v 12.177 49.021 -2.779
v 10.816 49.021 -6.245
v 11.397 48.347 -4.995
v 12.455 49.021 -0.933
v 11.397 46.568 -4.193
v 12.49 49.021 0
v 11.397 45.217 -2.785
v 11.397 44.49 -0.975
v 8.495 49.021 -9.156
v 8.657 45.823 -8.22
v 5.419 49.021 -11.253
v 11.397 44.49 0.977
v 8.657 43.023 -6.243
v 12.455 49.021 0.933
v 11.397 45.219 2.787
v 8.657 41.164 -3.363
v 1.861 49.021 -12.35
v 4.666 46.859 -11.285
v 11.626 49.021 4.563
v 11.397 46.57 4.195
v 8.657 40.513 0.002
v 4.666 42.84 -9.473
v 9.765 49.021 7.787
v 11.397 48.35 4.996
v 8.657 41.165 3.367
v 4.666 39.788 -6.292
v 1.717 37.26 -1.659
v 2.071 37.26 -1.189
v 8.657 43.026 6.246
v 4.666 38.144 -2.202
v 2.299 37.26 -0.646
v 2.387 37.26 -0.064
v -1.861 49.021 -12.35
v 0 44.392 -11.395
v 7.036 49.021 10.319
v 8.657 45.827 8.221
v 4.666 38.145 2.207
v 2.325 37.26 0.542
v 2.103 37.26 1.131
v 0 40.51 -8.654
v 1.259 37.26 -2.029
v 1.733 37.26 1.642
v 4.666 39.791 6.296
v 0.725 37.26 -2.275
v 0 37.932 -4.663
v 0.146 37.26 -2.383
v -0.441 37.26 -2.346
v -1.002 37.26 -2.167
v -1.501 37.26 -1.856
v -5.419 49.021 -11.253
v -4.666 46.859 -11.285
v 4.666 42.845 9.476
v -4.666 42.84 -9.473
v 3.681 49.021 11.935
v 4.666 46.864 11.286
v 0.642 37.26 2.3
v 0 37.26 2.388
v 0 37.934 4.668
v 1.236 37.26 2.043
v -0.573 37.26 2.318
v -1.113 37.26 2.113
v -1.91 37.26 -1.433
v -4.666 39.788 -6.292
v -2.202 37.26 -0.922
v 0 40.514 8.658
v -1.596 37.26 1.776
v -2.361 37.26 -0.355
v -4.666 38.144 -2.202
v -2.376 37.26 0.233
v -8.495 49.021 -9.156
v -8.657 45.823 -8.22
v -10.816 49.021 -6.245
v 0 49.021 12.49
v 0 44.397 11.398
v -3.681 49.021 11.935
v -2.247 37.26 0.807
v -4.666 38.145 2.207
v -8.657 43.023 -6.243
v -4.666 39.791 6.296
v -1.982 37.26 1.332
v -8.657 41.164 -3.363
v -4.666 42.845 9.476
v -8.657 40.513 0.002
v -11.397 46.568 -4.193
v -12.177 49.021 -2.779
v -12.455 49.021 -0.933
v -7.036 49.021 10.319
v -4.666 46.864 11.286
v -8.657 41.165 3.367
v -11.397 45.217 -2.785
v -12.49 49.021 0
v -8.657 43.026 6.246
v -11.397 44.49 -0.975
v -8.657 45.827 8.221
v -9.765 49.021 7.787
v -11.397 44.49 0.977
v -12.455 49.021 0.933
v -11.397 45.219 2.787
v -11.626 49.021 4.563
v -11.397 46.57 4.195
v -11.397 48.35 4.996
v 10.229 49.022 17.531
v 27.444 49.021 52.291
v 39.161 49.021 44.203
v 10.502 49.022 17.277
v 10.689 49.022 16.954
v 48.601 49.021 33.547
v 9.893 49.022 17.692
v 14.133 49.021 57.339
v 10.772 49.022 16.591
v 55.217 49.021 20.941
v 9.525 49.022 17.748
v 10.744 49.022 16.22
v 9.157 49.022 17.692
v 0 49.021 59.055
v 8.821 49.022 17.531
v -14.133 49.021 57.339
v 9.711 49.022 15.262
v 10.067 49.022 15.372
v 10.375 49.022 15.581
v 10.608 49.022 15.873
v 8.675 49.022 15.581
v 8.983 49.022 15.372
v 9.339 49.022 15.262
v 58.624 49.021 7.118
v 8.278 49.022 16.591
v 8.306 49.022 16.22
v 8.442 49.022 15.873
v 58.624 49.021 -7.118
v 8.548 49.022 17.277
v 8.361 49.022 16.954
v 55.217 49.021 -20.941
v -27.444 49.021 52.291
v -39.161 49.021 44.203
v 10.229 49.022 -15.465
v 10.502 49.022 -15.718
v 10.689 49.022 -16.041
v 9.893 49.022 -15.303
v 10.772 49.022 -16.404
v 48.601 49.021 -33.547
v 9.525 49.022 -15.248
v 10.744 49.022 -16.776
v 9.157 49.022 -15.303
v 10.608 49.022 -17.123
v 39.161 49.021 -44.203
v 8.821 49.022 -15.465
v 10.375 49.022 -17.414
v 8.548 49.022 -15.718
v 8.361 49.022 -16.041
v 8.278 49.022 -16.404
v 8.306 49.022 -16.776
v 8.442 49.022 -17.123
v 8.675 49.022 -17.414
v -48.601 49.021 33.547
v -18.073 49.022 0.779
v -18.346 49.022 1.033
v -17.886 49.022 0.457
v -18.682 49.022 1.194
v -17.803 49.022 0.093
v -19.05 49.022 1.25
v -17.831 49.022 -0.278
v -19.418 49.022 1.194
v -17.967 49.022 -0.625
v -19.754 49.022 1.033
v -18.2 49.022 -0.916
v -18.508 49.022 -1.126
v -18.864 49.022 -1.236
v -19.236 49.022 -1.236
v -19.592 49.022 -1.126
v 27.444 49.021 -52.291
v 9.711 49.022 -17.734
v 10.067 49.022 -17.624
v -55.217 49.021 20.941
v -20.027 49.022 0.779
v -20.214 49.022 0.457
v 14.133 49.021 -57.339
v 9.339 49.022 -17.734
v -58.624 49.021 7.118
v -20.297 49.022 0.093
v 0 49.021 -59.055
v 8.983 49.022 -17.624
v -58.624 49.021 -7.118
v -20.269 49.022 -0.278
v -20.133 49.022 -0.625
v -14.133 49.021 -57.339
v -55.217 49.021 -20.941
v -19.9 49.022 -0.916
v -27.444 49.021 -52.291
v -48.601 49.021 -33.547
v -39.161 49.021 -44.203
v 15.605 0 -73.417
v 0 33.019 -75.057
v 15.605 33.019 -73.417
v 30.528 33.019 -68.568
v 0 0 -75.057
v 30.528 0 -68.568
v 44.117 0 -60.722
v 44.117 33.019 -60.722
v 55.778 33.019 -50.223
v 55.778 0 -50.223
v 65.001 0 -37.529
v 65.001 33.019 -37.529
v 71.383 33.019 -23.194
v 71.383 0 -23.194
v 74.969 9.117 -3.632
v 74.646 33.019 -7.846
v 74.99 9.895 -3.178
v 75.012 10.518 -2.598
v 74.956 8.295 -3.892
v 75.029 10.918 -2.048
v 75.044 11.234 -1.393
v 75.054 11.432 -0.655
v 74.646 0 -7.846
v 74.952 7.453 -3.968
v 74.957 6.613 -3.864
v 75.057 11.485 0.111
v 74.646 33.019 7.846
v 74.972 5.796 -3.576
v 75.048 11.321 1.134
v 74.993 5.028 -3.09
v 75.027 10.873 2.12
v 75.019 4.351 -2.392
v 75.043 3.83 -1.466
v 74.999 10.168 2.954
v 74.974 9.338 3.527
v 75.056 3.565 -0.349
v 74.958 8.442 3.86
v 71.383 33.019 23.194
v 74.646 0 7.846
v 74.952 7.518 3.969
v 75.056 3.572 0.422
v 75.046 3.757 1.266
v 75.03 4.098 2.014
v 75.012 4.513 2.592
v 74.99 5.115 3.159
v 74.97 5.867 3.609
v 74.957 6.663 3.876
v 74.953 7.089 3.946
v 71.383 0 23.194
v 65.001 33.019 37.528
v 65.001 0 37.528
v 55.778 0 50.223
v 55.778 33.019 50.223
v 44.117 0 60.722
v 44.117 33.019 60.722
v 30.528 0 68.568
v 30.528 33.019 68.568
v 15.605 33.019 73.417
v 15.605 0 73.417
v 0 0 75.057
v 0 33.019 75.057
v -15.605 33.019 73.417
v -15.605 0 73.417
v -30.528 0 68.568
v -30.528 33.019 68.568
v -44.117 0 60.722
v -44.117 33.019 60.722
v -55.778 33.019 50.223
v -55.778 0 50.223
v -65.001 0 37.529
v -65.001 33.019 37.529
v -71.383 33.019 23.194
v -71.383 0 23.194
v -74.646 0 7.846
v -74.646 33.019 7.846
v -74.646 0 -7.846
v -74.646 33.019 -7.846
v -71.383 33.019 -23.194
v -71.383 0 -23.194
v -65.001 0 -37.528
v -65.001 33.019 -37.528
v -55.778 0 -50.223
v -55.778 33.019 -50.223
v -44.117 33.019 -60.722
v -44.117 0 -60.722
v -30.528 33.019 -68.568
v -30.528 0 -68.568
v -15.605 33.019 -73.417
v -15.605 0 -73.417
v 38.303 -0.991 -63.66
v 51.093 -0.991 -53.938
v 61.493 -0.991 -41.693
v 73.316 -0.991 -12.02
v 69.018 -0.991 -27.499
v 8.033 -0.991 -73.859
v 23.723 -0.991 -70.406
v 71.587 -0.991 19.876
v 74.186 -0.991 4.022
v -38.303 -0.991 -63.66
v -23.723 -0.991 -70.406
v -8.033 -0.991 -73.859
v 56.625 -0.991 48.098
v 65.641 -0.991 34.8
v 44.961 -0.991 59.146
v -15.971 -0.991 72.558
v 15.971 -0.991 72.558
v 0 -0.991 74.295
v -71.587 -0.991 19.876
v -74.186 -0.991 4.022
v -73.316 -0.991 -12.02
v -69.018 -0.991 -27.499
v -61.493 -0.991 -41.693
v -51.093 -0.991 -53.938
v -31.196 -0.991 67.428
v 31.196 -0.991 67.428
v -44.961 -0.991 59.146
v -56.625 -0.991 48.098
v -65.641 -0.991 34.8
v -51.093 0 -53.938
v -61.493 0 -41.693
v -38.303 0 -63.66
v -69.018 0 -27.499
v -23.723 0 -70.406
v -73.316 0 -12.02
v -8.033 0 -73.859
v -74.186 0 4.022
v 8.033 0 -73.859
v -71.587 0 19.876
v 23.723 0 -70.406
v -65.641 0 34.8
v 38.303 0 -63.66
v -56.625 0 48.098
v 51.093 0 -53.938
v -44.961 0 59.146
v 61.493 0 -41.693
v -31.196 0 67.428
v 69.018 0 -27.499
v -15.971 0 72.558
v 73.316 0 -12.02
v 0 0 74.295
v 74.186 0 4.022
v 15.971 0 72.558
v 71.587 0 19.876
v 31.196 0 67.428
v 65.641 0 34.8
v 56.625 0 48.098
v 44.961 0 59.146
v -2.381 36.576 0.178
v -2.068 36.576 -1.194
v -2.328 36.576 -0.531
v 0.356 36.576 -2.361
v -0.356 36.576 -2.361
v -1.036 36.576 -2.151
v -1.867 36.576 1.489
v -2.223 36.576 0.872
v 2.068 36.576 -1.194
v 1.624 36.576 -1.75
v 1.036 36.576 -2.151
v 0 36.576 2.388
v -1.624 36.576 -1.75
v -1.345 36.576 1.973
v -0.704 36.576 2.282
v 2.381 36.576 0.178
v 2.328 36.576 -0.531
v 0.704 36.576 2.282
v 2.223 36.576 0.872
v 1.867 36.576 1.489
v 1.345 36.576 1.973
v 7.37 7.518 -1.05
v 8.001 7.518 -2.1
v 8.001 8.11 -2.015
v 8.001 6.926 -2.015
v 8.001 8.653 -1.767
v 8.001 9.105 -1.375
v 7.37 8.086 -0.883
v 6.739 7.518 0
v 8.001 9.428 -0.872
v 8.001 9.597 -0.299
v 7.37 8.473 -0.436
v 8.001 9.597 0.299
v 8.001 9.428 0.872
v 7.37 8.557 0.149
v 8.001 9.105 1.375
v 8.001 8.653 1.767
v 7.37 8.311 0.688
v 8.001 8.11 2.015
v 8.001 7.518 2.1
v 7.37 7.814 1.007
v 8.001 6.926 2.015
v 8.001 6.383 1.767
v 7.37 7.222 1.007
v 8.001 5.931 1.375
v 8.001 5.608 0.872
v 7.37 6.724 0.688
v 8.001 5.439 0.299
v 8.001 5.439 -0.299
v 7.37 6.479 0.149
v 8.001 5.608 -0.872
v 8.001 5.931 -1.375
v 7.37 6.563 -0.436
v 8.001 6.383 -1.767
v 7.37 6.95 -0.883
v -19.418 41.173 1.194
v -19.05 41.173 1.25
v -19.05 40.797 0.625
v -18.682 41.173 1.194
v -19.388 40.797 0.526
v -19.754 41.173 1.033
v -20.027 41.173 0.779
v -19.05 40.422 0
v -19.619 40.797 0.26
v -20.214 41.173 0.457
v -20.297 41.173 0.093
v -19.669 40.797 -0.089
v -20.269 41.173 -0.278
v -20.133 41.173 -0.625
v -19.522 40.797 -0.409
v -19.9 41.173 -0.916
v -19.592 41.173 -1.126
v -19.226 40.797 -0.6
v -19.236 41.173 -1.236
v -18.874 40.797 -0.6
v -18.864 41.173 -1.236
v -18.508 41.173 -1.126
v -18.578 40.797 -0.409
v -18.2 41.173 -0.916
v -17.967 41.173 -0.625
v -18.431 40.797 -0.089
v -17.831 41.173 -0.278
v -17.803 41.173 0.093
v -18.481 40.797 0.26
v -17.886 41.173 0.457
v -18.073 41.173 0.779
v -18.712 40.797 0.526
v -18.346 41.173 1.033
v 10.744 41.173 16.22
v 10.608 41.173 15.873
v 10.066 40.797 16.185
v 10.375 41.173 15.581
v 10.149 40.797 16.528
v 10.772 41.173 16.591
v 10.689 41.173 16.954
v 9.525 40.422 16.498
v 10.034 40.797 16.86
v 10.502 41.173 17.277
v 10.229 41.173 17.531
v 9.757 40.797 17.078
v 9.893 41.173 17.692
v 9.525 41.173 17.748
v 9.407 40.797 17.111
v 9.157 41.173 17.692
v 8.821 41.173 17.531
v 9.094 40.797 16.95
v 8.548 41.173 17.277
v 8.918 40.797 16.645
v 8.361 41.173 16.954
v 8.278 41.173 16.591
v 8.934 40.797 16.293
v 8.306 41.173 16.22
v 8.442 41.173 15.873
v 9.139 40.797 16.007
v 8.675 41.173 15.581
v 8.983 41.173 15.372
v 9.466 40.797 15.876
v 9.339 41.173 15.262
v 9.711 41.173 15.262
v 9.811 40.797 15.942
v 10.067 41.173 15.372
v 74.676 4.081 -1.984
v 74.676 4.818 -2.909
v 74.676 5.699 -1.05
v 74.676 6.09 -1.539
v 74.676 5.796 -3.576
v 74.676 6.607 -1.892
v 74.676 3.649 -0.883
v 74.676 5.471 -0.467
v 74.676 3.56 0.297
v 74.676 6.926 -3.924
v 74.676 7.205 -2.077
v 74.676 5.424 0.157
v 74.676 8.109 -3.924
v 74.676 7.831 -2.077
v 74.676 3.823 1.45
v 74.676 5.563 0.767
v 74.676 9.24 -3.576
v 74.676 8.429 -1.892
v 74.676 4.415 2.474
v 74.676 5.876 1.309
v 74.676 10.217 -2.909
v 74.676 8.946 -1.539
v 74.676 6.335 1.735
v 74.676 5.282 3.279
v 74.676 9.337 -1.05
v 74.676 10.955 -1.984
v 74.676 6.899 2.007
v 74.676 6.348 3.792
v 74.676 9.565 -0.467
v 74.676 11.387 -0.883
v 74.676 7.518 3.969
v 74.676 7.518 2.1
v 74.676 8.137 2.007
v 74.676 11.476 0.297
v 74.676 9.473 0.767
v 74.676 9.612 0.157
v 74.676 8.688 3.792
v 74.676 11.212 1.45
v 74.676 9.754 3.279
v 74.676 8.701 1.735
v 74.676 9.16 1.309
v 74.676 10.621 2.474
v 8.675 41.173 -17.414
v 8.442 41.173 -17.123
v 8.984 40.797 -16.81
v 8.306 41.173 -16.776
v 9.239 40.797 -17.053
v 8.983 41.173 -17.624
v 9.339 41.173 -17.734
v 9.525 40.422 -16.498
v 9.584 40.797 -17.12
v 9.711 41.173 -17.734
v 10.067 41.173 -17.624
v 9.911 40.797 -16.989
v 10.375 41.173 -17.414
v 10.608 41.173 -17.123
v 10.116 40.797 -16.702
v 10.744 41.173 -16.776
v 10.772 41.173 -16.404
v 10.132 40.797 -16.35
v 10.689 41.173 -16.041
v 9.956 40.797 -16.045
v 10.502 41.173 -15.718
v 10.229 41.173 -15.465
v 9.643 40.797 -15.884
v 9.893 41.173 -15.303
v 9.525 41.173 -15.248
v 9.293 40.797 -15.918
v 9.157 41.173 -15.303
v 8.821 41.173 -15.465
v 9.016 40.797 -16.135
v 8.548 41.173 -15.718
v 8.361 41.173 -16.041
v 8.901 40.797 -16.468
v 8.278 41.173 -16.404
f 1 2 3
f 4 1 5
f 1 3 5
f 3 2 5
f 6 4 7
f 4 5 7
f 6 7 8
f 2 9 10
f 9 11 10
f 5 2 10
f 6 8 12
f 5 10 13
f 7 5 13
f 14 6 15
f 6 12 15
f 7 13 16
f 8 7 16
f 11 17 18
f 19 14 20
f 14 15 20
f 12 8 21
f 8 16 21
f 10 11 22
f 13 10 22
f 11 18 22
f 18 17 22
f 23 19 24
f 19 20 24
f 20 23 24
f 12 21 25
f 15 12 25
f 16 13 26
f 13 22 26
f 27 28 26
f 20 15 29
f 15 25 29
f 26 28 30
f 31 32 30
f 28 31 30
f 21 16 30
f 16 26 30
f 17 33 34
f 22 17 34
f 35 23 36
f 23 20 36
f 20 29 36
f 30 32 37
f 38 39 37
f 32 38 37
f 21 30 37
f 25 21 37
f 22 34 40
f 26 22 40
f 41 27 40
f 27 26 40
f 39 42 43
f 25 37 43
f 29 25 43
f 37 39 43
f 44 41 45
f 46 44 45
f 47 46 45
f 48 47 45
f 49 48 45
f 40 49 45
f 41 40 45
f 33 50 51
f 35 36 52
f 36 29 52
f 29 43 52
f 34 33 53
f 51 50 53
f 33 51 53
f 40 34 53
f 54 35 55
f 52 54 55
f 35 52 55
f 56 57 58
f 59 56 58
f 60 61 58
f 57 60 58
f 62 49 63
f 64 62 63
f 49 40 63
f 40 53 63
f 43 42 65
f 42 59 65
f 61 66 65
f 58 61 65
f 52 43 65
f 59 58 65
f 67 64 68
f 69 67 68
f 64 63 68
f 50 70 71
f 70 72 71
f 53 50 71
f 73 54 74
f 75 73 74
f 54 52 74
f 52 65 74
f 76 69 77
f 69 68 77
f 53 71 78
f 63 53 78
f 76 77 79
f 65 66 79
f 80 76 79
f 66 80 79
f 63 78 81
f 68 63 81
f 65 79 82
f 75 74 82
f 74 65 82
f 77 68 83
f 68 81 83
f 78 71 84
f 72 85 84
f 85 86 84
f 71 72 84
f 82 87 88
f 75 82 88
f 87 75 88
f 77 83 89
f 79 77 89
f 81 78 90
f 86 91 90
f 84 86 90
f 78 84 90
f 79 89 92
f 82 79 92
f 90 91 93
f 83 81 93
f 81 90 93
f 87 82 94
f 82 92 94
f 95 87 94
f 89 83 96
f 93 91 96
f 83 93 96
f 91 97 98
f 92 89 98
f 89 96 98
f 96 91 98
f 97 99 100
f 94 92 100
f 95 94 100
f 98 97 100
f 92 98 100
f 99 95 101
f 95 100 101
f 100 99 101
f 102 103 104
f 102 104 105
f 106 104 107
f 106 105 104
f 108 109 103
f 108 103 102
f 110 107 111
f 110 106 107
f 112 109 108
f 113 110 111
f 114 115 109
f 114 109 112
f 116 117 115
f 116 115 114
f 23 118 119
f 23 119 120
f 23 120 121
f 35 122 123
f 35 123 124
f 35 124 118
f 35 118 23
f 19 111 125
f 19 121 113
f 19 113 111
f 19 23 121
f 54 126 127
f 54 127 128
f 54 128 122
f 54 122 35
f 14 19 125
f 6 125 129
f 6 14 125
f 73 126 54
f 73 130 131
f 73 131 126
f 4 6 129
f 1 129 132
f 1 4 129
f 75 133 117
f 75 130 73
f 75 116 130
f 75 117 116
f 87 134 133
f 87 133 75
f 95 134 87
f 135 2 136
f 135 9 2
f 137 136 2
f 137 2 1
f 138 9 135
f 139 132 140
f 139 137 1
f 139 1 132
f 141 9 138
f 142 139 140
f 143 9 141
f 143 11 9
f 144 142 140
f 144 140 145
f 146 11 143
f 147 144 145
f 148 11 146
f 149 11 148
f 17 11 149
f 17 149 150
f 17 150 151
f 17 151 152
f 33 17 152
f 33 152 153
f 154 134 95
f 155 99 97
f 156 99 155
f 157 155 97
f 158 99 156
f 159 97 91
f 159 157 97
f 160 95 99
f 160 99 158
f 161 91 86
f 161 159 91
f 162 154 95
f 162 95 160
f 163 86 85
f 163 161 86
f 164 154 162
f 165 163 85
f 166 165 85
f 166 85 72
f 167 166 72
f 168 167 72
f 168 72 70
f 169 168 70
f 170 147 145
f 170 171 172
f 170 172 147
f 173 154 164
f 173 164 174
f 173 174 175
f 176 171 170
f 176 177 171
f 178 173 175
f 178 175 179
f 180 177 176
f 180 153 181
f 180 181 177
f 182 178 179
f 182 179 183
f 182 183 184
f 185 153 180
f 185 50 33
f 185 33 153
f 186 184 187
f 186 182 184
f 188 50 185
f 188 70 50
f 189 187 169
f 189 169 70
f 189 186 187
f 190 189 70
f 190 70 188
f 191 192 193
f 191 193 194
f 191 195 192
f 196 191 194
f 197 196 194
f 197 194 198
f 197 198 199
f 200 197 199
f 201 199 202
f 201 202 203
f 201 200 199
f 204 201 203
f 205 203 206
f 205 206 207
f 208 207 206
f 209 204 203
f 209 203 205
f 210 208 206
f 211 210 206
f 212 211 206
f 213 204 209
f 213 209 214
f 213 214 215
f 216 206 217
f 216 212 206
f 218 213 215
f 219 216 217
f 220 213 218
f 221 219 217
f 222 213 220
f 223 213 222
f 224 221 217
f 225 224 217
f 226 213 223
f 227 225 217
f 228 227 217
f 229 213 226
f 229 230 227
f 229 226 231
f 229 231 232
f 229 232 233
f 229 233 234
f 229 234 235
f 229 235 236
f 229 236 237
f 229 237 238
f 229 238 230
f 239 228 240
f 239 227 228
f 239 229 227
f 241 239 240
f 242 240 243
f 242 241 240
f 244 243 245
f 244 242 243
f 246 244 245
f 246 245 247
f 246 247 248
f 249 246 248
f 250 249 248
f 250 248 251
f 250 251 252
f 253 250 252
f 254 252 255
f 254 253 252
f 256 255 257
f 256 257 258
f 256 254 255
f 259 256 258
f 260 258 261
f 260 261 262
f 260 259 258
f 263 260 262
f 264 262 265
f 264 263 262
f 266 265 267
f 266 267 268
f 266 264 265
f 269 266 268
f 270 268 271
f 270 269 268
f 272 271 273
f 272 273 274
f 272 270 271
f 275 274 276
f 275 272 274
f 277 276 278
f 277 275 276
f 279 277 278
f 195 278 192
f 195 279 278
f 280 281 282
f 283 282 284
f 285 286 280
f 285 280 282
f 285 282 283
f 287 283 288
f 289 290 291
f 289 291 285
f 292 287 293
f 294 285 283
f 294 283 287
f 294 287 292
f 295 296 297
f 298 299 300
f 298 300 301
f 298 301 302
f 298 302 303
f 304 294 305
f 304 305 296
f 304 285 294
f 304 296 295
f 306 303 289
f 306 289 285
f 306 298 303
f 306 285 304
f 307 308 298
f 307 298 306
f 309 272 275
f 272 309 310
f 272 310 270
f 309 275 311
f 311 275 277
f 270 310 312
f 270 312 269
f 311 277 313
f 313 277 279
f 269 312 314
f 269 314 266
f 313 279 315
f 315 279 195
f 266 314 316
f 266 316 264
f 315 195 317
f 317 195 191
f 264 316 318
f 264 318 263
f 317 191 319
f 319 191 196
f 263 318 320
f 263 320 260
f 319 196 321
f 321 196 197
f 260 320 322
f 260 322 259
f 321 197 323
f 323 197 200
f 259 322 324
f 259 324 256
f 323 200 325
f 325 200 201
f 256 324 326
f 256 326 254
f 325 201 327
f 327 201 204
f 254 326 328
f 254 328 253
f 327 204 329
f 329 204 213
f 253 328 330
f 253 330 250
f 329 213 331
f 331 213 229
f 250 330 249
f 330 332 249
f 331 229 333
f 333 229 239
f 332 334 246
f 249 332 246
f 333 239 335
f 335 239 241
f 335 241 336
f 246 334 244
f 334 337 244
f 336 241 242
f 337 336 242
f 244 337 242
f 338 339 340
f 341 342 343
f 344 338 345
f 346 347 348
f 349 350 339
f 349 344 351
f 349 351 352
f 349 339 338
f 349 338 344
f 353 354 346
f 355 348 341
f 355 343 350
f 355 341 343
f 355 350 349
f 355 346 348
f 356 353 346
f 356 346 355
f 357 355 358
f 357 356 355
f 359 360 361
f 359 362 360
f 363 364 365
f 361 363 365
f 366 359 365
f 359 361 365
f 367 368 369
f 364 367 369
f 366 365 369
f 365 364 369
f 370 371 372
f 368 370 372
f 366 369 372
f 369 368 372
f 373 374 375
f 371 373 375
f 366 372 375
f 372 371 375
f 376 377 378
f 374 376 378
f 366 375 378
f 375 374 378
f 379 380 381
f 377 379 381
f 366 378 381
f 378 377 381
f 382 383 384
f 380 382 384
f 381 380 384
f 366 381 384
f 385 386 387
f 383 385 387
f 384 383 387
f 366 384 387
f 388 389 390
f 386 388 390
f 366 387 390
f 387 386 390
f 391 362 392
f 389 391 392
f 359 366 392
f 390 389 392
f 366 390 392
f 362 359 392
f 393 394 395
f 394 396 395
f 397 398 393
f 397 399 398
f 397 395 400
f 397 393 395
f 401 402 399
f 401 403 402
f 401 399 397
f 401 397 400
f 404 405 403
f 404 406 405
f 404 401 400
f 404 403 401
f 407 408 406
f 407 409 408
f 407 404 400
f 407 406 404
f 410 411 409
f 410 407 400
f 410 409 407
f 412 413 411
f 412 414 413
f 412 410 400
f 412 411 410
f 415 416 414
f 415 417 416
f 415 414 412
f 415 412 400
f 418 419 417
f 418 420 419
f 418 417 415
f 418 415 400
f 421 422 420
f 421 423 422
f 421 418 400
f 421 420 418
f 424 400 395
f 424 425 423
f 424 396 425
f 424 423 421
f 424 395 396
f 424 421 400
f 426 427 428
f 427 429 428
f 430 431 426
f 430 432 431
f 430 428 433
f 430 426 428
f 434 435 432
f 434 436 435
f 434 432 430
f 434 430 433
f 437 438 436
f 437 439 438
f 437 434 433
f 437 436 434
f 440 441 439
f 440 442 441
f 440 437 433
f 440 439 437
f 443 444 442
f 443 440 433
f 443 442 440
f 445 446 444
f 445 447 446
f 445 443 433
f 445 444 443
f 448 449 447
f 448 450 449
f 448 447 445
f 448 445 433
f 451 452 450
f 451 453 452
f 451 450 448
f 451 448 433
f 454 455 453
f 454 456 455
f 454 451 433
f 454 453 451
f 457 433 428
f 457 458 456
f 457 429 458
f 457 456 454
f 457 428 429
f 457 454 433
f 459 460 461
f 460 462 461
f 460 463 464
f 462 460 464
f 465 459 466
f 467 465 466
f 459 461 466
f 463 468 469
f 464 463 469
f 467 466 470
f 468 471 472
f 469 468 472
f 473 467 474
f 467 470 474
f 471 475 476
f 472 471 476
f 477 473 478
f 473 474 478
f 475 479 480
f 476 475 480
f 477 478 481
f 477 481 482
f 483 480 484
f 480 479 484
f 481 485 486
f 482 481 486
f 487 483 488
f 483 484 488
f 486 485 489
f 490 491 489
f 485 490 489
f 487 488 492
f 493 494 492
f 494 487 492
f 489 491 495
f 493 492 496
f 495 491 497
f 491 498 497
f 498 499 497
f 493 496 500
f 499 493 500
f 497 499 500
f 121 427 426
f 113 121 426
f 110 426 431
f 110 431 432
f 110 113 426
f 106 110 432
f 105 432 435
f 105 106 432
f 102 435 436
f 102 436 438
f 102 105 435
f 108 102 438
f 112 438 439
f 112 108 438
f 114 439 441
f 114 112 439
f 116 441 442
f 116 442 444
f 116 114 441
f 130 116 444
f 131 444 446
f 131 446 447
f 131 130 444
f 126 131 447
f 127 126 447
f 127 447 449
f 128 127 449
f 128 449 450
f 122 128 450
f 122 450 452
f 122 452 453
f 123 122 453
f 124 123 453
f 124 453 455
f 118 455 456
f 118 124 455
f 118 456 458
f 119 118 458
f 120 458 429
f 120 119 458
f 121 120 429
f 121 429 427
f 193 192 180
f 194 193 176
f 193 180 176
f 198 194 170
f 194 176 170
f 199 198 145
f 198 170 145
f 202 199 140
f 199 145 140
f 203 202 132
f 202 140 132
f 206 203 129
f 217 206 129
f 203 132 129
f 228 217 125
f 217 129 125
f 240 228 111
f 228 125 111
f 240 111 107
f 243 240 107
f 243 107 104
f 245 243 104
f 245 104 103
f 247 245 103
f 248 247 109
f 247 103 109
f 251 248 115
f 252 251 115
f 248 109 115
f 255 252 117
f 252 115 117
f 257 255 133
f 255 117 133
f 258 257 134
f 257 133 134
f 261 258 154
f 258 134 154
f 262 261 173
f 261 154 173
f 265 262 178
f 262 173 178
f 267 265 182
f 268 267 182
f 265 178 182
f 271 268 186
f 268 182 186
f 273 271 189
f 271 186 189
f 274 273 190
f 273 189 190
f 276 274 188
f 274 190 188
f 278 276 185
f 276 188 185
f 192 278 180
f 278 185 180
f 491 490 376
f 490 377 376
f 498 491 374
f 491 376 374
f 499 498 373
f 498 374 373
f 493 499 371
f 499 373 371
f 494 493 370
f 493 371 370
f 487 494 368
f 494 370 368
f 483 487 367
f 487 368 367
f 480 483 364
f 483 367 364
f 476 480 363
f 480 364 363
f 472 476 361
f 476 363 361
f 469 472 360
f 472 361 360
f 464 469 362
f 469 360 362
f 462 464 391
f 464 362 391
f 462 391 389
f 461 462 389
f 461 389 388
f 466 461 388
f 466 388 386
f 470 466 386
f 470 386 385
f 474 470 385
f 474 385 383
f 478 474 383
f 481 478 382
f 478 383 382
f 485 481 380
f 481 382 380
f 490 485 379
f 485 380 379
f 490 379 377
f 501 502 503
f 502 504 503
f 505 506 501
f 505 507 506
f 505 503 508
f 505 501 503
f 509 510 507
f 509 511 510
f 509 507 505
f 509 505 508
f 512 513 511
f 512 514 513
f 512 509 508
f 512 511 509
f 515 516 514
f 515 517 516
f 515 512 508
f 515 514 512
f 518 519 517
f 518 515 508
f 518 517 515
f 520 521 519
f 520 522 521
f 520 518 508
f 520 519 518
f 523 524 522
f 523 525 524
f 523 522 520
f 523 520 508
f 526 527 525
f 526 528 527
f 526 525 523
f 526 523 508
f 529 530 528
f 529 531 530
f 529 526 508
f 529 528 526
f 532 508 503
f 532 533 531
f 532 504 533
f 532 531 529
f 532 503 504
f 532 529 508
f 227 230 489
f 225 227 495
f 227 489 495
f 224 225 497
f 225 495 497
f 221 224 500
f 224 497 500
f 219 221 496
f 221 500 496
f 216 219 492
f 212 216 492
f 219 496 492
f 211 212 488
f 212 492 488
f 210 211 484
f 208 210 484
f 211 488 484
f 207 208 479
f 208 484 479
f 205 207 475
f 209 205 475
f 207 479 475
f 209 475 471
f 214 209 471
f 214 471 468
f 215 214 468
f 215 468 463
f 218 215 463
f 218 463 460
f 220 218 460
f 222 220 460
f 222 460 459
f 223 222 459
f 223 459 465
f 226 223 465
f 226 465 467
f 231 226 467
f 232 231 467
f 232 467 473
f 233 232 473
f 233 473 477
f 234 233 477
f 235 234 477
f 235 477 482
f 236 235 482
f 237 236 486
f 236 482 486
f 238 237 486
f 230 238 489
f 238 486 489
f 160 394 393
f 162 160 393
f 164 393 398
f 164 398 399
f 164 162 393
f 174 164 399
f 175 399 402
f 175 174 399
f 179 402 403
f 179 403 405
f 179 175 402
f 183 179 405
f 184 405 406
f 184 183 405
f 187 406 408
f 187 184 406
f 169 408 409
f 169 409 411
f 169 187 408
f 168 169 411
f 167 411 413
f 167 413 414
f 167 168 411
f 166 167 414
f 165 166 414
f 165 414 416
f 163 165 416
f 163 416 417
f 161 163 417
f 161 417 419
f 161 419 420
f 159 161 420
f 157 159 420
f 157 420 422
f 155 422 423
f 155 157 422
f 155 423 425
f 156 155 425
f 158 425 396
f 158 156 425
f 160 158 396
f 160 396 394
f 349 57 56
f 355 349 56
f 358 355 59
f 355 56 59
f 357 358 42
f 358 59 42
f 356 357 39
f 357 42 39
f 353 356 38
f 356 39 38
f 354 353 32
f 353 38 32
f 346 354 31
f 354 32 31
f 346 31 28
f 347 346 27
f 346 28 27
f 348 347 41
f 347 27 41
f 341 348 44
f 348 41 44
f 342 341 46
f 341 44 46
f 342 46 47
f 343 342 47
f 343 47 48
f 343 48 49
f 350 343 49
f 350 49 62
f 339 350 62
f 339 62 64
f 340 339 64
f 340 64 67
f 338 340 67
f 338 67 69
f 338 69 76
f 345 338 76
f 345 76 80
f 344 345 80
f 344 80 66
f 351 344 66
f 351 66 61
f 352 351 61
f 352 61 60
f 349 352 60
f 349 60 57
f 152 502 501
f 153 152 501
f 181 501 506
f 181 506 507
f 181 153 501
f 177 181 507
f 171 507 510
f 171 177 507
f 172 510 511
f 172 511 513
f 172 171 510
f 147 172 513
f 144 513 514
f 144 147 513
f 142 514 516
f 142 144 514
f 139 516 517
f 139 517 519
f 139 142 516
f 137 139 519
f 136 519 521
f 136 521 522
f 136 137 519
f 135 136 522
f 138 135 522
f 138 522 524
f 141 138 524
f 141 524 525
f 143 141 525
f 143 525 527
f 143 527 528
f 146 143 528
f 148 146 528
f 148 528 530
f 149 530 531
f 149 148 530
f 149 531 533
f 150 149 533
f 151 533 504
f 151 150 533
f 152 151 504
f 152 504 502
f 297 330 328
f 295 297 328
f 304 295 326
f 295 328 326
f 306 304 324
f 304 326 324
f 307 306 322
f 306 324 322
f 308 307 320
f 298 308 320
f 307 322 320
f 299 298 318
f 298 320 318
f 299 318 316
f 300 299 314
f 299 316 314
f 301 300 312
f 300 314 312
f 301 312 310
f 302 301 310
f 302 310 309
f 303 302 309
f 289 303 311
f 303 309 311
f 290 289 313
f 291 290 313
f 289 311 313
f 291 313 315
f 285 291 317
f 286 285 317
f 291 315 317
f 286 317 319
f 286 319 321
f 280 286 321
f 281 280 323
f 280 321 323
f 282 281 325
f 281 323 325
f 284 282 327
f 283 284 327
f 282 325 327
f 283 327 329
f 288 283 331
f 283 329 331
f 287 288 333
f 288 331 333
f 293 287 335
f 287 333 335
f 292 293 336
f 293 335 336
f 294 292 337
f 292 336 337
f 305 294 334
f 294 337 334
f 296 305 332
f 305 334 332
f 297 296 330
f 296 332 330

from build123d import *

# Parameters (mm, degrees)
SKETCH1_R                          = 76.2
MAIN_EXTRUDE_DEPTH                 = 50.5582
SKETCH4_R                          = 76.2
SKETCH4_R_2                        = 75.057
TURN_OUTSIDE_DEPTH                 = 37.846
SKETCH5_R                          = 74.295
EXTRUDE1_DEPTH                     = 0.9906
SKETCH7_R                          = 76.2
FACE_BOTTOM_DEPTH                  = 1.5367
SKETCH8_R                          = 76.2
SKETCH8_R_2                        = 75.057
TURN_REST_OF_OUTSIDE_DEPTH         = 12.1755
SKETCH3_R                          = 2.3876
PILOT_HOLE_FOR_BALL_DEPTH          = 12.446
SPHERICAL_BALL_ANGLE               = 180
CHAMFER1_SIZE                      = 16.002
F_5_16_0_3125_DIAMETER_HOLE1_D     = 7.9375
F_5_16_0_3125_DIAMETER_HOLE1_DEPTH = 0.508
RETAINER_HOLE_PATTERN_COUNT        = 3
M5X0_8_TAPPED_HOLE1_D              = 4.2
M5X0_8_TAPPED_HOLE1_DEPTH          = 66.675
M5X0_8_TAPPED_HOLE1_TIP            = 1.2618073


with BuildPart() as part:
    # Sketch1 → Main Extrude (new body)
    with BuildSketch(Plane(origin=(0, 0, 0), x_dir=(1, 0, 0), z_dir=(0, 1, 0))):
        with Locations(Location((0, 0, 0), (0, 0, 270))):  # turned: the seam where the file's is
            Circle(SKETCH1_R)
    extrude(amount=MAIN_EXTRUDE_DEPTH)

    # Sketch4 → Turn Outside (cut)
    with BuildSketch(Plane.XZ):
        with Locations(Location((0, 0, 0), (0, 0, 270))):  # turned: the seam where the file's is
            Circle(SKETCH4_R)
        with Locations(Location((0, 0, 0), (0, 0, 270))):  # turned: the seam where the file's is
            Circle(SKETCH4_R_2, mode=Mode.SUBTRACT)
    extrude(amount=-TURN_OUTSIDE_DEPTH, mode=Mode.SUBTRACT)

    # Sketch5 → Extrude1 (add)
    with BuildSketch(Plane.XZ):
        with Locations(Location((0, 0, 0), (0, 0, 90))):  # turned: the seam where the file's is
            Circle(SKETCH5_R)
    extrude(amount=EXTRUDE1_DEPTH)

    # Sketch7 → Face Bottom (cut)
    with BuildSketch(Plane(origin=(0, 50.5582, 0), x_dir=(-1, 0, 0), z_dir=(0, 1, 0))):
        with Locations(Location((0, 0, 0), (0, 0, 270))):  # turned: the seam where the file's is
            Circle(SKETCH7_R)
    extrude(amount=-FACE_BOTTOM_DEPTH, mode=Mode.SUBTRACT)

    # Sketch8 → Turn rest of outside (cut, through all)
    with BuildSketch(Plane.XZ.offset(-37.846)):
        Circle(SKETCH8_R)
        with Locations(Location((0, 0, 0), (0, 0, 270))):  # turned: the seam where the file's is
            Circle(SKETCH8_R_2, mode=Mode.SUBTRACT)
    extrude(amount=-TURN_REST_OF_OUTSIDE_DEPTH, mode=Mode.SUBTRACT)

    # Sketch3 → Pilot hole for ball (cut)
    with BuildSketch(Plane(origin=(0, 49.0215, 0), x_dir=(-1, 0, 0), z_dir=(0, 1, 0))):
        with Locations(Location((0, 0, 0), (0, 0, 90))):  # turned: the seam where the file's is
            Circle(SKETCH3_R)
    extrude(amount=-PILOT_HOLE_FOR_BALL_DEPTH, mode=Mode.SUBTRACT)

    # Sketch2 → Spherical Ball (revolve, cut)
    with BuildSketch(Plane(origin=(0, 49.5295, 0), x_dir=(-1, 0, 0), z_dir=(0, 1, 0))):
        with BuildLine():
            Line((12.499975, 0), (-12.499975, 0))
            ThreePointArc((-12.499975, 0), (0, -12.499975), (12.499975, 0))
        make_face()
    revolve(axis=Axis((-12.499975, 49.5295, 0), (-1, 0, 0)), revolution_arc=SPHERICAL_BALL_ANGLE, mode=Mode.SUBTRACT)

    # Chamfer1
    chamfer1_edges = [part.edges().sort_by_distance(p)[0] for p in [
        (0, 49.0215, 75.057),
    ]]
    chamfer(chamfer1_edges, length=CHAMFER1_SIZE)

    # 5_16 _0.3125_ Diameter Hole1
    with Locations(Plane(origin=(75.184, 0, 0), x_dir=(0, 0, -1), z_dir=(1, 0, 0))):
        with Locations((0, 7.5179)):
            Hole(F_5_16_0_3125_DIAMETER_HOLE1_D / 2, depth=F_5_16_0_3125_DIAMETER_HOLE1_DEPTH)

    # Sketch15 → M3x0.5 Retainer Hole (revolve, cut)
    with BuildSketch(Plane(origin=(-19.05, 49.0215, 0), x_dir=(0, 0, 1), z_dir=(1, 0, 0))):
        Polygon((0, 0), (0, 8.599675774), (1.25, 7.8486), (1.25, 0), align=None)
    m3x0_5_retainer_hole = revolve(axis=Axis((-19.05, 55.3715, 0), (0, -1, 0)), mode=Mode.SUBTRACT)

    # Retainer hole pattern: M3x0.5 Retainer Hole ×3 about axis
    retainer_hole_pattern_axis = Axis((0, 0, 0), (0, 1, 0))
    for i in range(1, RETAINER_HOLE_PATTERN_COUNT):
        add(m3x0_5_retainer_hole.rotate(retainer_hole_pattern_axis, i * 360 / RETAINER_HOLE_PATTERN_COUNT), mode=Mode.SUBTRACT)

    # M5x0.8 Tapped Hole1
    with Locations(Plane(origin=(74.676, 0, 0), x_dir=(0, 0, -1), z_dir=(1, 0, 0))):
        with Locations((0, 7.5179)):
            Hole(M5X0_8_TAPPED_HOLE1_D / 2, depth=M5X0_8_TAPPED_HOLE1_DEPTH)
            with Locations((0, 0, -(M5X0_8_TAPPED_HOLE1_DEPTH + M5X0_8_TAPPED_HOLE1_TIP / 2))):  # 118° drill point
                Cone(0, M5X0_8_TAPPED_HOLE1_D / 2, M5X0_8_TAPPED_HOLE1_TIP, mode=Mode.SUBTRACT)


solid = part.part
